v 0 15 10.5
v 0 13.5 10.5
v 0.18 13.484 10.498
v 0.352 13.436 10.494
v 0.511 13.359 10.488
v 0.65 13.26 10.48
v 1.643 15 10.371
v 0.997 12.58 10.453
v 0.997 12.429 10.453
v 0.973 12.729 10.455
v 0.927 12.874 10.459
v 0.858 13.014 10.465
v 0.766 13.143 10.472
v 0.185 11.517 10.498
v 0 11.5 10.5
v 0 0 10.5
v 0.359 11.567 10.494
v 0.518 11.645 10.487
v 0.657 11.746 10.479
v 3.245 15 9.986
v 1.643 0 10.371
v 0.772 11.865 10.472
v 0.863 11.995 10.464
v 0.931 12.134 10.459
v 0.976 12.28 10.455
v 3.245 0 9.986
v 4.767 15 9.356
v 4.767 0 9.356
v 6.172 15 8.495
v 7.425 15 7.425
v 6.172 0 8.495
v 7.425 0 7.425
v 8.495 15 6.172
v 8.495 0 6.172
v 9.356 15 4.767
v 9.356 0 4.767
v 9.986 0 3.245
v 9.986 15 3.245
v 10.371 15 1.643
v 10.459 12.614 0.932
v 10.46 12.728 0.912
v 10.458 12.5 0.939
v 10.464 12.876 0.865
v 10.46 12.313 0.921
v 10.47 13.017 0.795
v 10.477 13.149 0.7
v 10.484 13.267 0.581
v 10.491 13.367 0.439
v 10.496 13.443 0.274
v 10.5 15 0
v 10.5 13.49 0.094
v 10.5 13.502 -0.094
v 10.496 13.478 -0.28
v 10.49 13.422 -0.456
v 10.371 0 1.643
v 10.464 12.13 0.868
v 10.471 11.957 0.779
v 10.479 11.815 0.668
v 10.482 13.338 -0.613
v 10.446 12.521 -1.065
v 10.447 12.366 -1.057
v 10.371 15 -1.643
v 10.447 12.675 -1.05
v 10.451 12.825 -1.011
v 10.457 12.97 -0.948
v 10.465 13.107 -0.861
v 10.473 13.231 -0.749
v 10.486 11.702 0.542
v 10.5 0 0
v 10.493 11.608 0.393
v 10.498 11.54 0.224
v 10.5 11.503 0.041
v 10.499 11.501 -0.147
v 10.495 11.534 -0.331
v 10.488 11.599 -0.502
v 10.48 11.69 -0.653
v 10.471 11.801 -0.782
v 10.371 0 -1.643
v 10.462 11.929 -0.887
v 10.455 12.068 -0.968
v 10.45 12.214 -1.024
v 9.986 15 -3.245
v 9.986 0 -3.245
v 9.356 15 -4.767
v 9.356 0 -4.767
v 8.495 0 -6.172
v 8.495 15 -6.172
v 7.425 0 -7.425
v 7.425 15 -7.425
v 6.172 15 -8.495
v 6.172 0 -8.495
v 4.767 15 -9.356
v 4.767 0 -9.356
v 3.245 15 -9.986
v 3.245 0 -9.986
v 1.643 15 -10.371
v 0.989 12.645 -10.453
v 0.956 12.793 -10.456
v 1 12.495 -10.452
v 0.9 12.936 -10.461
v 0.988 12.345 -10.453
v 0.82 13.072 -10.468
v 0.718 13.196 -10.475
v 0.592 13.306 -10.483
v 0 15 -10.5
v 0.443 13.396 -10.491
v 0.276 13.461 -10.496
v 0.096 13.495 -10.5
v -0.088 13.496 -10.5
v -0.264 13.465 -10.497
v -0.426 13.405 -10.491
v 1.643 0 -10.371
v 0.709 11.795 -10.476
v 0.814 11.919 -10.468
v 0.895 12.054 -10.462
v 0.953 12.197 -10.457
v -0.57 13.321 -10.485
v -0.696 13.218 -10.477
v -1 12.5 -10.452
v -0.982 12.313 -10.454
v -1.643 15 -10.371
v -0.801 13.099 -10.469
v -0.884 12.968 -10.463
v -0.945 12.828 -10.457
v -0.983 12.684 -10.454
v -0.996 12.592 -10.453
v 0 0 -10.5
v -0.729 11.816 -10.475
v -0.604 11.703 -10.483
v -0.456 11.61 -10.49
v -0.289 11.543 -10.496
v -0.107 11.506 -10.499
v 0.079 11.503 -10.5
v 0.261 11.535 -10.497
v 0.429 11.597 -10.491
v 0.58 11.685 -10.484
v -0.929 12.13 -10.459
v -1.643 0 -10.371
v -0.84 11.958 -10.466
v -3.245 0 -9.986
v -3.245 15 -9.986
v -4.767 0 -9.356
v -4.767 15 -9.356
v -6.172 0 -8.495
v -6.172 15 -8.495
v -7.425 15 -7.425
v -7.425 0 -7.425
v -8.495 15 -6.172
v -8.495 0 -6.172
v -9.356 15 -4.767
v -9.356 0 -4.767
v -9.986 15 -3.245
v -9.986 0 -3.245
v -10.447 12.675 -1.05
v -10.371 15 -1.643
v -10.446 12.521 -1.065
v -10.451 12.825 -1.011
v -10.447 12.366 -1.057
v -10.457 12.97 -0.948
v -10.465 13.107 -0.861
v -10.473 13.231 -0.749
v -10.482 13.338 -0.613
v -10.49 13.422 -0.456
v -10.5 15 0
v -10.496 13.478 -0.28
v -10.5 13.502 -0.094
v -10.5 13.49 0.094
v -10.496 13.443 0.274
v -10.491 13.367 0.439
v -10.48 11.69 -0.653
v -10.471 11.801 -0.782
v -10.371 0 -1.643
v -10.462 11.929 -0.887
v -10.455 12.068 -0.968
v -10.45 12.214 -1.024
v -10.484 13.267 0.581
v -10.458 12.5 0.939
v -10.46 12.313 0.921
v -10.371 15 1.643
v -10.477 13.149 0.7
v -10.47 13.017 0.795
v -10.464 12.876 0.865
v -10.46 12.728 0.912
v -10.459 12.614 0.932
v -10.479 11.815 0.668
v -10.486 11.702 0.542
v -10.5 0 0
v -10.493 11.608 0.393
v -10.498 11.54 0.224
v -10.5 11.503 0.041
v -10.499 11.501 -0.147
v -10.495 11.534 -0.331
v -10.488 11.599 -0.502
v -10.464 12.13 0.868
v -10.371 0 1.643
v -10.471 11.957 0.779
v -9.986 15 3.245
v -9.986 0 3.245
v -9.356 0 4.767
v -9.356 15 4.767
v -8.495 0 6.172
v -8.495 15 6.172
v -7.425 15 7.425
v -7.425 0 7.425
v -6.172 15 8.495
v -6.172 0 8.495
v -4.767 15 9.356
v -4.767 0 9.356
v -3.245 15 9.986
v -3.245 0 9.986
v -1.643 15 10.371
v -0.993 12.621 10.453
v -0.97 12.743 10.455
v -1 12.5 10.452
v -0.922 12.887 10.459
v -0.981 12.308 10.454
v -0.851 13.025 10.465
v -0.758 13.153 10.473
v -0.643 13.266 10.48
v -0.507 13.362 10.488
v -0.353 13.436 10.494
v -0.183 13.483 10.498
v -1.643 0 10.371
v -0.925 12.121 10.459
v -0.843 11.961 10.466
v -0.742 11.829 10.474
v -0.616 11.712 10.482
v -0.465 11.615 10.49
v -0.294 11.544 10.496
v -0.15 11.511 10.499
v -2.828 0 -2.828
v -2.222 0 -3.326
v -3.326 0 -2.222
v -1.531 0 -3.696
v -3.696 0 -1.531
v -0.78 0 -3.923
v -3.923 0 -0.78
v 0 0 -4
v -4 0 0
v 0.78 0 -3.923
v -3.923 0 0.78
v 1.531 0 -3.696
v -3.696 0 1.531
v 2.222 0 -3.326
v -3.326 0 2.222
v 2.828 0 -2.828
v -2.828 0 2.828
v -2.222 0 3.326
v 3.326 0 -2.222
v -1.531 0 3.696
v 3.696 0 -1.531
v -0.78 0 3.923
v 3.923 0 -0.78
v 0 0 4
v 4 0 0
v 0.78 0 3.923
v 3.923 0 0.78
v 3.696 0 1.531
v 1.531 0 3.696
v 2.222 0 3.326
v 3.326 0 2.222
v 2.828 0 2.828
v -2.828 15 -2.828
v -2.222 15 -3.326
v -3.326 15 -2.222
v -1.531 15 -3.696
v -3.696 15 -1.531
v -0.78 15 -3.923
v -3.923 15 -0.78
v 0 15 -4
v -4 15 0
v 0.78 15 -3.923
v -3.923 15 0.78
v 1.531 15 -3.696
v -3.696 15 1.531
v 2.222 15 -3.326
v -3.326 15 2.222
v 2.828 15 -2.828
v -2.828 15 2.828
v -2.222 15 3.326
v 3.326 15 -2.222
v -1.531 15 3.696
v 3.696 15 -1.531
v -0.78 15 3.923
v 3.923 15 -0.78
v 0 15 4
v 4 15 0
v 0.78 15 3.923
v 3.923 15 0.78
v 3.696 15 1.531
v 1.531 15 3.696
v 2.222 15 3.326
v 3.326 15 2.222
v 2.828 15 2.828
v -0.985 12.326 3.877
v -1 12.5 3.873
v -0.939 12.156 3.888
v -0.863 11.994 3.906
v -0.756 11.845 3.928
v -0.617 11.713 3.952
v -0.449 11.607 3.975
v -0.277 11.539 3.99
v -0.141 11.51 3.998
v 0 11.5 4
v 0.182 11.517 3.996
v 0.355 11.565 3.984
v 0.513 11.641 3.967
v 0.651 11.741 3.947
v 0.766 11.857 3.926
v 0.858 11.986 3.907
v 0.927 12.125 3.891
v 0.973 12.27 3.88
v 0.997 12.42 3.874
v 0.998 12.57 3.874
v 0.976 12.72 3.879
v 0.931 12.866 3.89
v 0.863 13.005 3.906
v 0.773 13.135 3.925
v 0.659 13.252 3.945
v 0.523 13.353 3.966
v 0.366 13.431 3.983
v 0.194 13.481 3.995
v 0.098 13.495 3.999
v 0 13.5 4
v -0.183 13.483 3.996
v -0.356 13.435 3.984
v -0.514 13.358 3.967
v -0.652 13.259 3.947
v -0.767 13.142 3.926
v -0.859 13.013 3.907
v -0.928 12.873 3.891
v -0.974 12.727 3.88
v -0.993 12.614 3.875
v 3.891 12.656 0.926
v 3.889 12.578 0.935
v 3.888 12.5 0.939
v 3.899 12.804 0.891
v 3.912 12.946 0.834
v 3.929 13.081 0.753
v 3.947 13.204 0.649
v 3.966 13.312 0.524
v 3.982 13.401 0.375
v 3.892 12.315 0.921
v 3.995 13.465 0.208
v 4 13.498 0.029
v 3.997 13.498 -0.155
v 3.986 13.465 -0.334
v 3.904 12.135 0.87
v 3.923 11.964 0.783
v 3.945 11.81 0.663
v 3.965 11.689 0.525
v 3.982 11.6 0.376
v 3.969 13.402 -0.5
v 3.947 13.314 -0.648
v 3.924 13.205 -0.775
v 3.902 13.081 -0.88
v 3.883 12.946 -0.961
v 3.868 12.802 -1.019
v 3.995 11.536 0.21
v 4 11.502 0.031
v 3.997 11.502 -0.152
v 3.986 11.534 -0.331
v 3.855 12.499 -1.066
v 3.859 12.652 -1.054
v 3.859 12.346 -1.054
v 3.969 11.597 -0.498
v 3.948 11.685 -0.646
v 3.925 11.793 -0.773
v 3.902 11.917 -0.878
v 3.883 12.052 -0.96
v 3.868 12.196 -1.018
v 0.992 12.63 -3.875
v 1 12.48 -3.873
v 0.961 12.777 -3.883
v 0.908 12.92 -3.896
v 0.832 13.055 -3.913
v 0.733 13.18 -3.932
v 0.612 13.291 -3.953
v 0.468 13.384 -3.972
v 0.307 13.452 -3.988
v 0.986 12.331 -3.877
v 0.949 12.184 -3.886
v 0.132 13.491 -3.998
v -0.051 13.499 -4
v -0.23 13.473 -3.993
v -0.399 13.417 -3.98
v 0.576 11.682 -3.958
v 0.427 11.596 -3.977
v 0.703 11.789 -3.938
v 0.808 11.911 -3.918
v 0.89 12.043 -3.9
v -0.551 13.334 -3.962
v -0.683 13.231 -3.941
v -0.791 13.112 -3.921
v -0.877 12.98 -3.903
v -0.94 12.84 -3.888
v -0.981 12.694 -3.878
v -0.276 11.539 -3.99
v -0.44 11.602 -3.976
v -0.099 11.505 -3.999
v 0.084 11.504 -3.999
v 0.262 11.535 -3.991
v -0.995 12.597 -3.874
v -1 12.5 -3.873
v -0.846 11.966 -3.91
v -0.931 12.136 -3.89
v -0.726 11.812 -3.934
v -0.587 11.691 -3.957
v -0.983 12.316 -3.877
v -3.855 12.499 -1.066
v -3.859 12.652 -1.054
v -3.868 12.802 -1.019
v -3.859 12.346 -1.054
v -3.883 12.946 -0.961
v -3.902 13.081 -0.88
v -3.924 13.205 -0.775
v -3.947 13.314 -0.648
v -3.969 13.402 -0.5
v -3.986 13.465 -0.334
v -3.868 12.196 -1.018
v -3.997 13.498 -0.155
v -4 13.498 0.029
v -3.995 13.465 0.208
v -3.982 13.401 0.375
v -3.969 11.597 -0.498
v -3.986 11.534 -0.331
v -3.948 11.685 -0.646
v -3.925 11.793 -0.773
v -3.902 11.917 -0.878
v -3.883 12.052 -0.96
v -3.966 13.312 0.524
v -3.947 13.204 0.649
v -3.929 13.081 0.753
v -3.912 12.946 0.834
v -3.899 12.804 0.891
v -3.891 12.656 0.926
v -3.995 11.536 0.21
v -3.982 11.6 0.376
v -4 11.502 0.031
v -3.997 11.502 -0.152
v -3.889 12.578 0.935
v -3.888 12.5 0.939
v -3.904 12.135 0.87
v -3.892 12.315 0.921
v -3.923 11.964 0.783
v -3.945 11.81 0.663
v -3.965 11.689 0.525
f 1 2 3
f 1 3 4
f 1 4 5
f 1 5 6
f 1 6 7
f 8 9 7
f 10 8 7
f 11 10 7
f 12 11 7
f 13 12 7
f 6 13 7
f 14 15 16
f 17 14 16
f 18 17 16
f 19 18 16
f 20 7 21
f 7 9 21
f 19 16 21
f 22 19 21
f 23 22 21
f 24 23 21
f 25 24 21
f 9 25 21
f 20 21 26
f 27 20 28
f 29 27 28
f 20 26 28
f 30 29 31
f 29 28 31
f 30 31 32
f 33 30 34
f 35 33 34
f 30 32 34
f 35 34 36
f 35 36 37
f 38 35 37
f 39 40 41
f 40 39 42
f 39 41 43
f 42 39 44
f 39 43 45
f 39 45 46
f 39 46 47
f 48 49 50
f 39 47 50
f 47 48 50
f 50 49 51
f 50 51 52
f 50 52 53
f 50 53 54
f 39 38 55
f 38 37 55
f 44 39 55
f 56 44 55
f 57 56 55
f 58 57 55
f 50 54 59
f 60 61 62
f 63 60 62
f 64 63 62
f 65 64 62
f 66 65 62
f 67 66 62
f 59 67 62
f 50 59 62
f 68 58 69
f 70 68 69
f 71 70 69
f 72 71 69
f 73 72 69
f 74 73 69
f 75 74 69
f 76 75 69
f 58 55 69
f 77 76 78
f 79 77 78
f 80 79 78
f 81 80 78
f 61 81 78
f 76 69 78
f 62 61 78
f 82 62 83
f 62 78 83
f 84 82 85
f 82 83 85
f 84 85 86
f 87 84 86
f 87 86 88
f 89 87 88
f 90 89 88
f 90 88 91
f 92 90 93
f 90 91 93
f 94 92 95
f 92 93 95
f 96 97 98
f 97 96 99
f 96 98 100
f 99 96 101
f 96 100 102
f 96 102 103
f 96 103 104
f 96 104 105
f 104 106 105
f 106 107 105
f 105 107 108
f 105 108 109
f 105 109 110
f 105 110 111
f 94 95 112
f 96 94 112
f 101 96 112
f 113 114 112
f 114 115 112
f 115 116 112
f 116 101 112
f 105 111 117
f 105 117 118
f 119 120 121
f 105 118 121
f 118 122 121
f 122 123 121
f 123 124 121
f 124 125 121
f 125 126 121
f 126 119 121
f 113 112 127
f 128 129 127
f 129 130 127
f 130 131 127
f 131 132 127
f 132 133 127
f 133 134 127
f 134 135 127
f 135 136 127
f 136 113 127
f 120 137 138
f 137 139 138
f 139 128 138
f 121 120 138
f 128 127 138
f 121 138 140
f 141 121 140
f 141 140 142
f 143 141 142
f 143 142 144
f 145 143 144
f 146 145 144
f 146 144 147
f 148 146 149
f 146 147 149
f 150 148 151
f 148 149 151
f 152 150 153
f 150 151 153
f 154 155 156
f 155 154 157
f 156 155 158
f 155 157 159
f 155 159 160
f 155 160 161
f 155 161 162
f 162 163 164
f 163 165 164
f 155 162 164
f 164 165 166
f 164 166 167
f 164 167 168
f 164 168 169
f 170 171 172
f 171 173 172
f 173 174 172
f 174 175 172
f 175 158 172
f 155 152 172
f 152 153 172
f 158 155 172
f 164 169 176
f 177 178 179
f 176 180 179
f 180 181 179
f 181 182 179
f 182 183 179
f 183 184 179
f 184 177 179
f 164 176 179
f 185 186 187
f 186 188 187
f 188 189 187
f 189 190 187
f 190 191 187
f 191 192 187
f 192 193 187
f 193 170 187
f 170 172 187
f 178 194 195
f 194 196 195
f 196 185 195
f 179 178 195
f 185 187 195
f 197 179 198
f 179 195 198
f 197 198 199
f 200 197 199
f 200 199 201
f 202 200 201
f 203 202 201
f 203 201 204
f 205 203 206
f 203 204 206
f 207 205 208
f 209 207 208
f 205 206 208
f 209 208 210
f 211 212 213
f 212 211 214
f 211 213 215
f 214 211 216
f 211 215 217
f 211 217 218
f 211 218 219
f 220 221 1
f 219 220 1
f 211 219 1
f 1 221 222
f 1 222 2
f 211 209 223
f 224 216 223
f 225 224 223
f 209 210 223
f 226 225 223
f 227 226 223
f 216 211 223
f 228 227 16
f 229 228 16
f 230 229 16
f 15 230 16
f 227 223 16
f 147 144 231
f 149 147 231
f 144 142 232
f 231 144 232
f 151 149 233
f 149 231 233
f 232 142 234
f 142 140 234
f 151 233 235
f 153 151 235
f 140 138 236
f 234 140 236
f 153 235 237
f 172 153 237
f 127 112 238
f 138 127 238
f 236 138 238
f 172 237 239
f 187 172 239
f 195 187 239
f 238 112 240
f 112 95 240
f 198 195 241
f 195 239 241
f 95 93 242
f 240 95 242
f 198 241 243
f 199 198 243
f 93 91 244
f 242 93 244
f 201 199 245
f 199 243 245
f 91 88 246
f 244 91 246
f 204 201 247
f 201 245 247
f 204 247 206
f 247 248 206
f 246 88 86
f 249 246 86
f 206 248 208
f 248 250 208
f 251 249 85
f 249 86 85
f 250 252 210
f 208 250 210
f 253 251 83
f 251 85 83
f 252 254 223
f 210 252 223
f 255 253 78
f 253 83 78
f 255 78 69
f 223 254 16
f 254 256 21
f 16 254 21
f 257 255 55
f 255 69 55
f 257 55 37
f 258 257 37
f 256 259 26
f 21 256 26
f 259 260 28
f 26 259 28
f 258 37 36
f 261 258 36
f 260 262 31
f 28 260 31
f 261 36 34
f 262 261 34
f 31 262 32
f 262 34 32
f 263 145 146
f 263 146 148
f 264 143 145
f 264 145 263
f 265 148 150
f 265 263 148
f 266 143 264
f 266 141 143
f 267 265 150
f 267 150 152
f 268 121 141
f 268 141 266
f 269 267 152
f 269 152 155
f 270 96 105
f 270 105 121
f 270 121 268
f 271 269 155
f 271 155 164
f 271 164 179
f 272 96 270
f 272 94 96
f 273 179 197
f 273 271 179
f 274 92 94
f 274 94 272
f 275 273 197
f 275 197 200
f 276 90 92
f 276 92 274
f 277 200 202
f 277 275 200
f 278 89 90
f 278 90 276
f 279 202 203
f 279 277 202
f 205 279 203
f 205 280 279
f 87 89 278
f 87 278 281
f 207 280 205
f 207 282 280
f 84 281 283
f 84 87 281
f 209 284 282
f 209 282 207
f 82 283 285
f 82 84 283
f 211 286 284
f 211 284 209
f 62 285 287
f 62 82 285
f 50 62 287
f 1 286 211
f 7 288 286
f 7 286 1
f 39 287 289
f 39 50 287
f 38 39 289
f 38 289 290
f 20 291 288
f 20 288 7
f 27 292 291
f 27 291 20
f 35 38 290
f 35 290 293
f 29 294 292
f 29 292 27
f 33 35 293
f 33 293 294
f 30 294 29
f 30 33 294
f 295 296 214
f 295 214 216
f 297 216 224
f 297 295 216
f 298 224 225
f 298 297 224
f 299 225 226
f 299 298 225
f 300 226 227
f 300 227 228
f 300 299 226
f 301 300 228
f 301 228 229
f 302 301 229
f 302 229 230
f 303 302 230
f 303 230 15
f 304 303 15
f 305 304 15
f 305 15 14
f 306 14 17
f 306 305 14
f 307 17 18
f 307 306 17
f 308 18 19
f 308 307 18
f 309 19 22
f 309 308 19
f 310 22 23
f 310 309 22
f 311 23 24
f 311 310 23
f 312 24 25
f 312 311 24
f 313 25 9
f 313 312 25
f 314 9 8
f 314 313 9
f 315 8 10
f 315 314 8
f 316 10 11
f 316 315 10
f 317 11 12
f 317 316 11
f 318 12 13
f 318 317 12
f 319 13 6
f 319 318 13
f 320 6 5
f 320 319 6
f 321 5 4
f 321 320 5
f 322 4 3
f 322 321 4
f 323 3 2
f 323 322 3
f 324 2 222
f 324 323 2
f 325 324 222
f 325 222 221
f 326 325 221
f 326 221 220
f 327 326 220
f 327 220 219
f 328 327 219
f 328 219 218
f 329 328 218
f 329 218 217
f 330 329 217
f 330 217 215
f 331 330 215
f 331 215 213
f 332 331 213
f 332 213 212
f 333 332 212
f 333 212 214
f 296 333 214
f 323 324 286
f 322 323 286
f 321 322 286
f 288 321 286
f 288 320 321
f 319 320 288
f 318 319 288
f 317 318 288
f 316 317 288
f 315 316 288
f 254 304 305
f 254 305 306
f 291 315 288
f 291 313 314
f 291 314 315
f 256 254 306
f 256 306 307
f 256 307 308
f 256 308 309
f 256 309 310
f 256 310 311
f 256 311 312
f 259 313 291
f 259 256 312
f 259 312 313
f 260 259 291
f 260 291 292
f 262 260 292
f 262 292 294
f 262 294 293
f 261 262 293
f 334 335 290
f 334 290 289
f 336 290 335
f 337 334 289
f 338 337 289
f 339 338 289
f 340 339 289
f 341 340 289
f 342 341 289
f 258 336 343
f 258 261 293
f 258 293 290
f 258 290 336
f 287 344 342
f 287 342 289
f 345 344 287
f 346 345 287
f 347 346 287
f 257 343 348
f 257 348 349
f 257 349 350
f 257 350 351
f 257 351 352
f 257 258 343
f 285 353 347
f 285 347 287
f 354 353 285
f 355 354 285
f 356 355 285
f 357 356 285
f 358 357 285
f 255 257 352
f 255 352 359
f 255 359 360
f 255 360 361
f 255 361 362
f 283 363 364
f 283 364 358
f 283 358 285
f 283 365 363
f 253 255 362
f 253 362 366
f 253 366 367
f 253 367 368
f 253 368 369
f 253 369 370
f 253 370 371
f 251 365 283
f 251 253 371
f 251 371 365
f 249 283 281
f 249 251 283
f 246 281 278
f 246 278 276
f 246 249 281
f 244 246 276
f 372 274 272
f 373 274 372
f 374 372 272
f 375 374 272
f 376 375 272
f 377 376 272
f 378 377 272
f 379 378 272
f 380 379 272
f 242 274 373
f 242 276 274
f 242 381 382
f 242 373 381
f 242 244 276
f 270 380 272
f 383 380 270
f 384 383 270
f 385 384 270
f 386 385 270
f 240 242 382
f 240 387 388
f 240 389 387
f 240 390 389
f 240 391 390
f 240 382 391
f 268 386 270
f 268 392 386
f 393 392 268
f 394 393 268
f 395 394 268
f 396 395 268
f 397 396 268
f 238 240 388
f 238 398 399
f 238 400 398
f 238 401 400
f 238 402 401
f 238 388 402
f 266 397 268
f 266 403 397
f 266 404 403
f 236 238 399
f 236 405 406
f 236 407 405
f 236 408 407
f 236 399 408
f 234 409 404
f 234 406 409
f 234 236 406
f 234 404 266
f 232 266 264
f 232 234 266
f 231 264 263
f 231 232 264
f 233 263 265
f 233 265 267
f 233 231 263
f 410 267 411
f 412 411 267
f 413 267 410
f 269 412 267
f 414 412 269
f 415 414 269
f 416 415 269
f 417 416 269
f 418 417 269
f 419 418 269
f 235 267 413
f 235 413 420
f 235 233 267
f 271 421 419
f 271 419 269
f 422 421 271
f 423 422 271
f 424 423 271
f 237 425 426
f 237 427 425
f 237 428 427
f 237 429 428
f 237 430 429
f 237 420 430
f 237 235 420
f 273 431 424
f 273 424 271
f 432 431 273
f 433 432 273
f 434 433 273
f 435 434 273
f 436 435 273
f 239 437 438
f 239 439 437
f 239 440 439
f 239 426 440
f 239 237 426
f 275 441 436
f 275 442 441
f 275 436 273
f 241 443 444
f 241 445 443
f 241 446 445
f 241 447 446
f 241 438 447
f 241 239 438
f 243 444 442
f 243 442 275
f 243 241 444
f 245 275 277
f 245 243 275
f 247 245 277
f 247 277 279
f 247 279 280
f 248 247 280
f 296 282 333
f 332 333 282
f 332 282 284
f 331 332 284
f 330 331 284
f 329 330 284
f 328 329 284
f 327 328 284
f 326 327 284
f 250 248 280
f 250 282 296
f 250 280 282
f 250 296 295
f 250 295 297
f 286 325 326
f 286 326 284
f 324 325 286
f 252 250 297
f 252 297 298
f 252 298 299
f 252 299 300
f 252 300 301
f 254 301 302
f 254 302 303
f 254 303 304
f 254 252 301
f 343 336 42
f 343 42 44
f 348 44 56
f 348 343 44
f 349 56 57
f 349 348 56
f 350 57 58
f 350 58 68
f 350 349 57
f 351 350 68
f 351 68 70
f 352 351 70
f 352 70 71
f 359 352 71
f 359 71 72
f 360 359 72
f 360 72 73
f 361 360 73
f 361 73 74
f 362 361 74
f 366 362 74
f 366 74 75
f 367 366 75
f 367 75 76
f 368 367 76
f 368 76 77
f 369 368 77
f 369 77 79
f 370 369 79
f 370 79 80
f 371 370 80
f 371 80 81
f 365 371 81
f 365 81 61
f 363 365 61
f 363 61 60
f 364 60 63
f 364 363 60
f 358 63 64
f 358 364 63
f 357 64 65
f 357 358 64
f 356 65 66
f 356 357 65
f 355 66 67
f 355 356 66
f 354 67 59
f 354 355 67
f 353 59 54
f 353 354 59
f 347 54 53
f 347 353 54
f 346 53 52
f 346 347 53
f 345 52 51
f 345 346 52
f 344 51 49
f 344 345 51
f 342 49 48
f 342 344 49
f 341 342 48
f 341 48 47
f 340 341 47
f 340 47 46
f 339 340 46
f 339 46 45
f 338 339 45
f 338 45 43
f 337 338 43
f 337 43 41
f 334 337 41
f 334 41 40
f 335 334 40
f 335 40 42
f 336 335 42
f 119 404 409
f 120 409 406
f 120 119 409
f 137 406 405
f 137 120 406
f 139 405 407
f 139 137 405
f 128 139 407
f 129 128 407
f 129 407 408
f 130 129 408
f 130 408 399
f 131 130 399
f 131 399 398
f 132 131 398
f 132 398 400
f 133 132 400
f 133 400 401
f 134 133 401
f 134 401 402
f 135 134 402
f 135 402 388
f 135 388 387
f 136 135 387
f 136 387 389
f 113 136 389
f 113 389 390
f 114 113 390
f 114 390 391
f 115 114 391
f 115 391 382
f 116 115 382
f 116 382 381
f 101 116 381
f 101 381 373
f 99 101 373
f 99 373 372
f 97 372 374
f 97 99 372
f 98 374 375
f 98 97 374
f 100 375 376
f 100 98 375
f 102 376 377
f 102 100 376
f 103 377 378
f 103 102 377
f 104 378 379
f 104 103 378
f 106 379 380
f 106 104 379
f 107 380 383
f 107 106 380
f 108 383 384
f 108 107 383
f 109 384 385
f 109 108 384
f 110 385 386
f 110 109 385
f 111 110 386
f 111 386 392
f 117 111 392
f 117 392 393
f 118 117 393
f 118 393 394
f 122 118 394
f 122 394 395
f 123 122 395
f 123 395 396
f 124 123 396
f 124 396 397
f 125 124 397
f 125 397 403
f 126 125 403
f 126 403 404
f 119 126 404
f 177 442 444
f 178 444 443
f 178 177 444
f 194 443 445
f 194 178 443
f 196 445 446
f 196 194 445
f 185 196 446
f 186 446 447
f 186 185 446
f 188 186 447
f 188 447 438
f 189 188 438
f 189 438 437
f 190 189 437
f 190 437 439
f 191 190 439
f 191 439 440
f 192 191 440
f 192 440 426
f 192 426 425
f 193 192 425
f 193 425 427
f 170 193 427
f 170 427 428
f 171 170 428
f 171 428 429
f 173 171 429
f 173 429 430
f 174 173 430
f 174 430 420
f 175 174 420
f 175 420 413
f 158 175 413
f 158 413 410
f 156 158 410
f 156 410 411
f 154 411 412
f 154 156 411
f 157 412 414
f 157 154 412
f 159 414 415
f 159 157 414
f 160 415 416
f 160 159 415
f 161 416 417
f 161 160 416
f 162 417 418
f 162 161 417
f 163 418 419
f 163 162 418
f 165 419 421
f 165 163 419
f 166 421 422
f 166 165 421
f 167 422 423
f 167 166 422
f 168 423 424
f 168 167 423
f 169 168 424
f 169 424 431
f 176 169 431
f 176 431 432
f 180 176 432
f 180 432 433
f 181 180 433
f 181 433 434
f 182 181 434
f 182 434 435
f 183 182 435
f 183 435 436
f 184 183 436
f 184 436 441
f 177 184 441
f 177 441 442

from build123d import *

# Parameters (mm, degrees)
CROQUIS1_R                 = 10.5
CROQUIS1_R_2               = 4
SALIENTE_EXTRUIR1_DEPTH    = 15
CORTAR_EXTRUIR1_DEPTH      = 15
CORTAR_EXTRUIR1_DEPTH_BACK = 15
CROQUIS2_R                 = 1
CORTAR_EXTRUIR2_DEPTH      = 15
CORTAR_EXTRUIR2_DEPTH_BACK = 15
CROQUIS3_R                 = 1.002014624


with BuildPart() as part:
    # Croquis1 → Saliente-Extruir1 (new body)
    with BuildSketch(Plane(origin=(0, 0, 0), x_dir=(1, 0, 0), z_dir=(0, 1, 0))):
        Circle(CROQUIS1_R)
        Circle(CROQUIS1_R_2, mode=Mode.SUBTRACT)
    extrude(amount=SALIENTE_EXTRUIR1_DEPTH)

    # Croquis2 → Cortar-Extruir1 (cut, two sides: drawn at the far end of the back side and taken through both)
    with BuildSketch(Plane.XY.offset(-CORTAR_EXTRUIR1_DEPTH_BACK)):
        with Locations((0, 12.5)):
            Circle(CROQUIS2_R)
    extrude(amount=CORTAR_EXTRUIR1_DEPTH + CORTAR_EXTRUIR1_DEPTH_BACK, mode=Mode.SUBTRACT)

    # Croquis3 → Cortar-Extruir2 (cut, two sides: drawn at the far end of the back side and taken through both)
    with BuildSketch(Plane(origin=(0, 0, 0), x_dir=(0, 0, -1), z_dir=(1, 0, 0)).offset(-CORTAR_EXTRUIR2_DEPTH_BACK)):
        with Locations((0.063508327, 12.5)):
            Circle(CROQUIS3_R)
    extrude(amount=CORTAR_EXTRUIR2_DEPTH + CORTAR_EXTRUIR2_DEPTH_BACK, mode=Mode.SUBTRACT)


solid = part.part
